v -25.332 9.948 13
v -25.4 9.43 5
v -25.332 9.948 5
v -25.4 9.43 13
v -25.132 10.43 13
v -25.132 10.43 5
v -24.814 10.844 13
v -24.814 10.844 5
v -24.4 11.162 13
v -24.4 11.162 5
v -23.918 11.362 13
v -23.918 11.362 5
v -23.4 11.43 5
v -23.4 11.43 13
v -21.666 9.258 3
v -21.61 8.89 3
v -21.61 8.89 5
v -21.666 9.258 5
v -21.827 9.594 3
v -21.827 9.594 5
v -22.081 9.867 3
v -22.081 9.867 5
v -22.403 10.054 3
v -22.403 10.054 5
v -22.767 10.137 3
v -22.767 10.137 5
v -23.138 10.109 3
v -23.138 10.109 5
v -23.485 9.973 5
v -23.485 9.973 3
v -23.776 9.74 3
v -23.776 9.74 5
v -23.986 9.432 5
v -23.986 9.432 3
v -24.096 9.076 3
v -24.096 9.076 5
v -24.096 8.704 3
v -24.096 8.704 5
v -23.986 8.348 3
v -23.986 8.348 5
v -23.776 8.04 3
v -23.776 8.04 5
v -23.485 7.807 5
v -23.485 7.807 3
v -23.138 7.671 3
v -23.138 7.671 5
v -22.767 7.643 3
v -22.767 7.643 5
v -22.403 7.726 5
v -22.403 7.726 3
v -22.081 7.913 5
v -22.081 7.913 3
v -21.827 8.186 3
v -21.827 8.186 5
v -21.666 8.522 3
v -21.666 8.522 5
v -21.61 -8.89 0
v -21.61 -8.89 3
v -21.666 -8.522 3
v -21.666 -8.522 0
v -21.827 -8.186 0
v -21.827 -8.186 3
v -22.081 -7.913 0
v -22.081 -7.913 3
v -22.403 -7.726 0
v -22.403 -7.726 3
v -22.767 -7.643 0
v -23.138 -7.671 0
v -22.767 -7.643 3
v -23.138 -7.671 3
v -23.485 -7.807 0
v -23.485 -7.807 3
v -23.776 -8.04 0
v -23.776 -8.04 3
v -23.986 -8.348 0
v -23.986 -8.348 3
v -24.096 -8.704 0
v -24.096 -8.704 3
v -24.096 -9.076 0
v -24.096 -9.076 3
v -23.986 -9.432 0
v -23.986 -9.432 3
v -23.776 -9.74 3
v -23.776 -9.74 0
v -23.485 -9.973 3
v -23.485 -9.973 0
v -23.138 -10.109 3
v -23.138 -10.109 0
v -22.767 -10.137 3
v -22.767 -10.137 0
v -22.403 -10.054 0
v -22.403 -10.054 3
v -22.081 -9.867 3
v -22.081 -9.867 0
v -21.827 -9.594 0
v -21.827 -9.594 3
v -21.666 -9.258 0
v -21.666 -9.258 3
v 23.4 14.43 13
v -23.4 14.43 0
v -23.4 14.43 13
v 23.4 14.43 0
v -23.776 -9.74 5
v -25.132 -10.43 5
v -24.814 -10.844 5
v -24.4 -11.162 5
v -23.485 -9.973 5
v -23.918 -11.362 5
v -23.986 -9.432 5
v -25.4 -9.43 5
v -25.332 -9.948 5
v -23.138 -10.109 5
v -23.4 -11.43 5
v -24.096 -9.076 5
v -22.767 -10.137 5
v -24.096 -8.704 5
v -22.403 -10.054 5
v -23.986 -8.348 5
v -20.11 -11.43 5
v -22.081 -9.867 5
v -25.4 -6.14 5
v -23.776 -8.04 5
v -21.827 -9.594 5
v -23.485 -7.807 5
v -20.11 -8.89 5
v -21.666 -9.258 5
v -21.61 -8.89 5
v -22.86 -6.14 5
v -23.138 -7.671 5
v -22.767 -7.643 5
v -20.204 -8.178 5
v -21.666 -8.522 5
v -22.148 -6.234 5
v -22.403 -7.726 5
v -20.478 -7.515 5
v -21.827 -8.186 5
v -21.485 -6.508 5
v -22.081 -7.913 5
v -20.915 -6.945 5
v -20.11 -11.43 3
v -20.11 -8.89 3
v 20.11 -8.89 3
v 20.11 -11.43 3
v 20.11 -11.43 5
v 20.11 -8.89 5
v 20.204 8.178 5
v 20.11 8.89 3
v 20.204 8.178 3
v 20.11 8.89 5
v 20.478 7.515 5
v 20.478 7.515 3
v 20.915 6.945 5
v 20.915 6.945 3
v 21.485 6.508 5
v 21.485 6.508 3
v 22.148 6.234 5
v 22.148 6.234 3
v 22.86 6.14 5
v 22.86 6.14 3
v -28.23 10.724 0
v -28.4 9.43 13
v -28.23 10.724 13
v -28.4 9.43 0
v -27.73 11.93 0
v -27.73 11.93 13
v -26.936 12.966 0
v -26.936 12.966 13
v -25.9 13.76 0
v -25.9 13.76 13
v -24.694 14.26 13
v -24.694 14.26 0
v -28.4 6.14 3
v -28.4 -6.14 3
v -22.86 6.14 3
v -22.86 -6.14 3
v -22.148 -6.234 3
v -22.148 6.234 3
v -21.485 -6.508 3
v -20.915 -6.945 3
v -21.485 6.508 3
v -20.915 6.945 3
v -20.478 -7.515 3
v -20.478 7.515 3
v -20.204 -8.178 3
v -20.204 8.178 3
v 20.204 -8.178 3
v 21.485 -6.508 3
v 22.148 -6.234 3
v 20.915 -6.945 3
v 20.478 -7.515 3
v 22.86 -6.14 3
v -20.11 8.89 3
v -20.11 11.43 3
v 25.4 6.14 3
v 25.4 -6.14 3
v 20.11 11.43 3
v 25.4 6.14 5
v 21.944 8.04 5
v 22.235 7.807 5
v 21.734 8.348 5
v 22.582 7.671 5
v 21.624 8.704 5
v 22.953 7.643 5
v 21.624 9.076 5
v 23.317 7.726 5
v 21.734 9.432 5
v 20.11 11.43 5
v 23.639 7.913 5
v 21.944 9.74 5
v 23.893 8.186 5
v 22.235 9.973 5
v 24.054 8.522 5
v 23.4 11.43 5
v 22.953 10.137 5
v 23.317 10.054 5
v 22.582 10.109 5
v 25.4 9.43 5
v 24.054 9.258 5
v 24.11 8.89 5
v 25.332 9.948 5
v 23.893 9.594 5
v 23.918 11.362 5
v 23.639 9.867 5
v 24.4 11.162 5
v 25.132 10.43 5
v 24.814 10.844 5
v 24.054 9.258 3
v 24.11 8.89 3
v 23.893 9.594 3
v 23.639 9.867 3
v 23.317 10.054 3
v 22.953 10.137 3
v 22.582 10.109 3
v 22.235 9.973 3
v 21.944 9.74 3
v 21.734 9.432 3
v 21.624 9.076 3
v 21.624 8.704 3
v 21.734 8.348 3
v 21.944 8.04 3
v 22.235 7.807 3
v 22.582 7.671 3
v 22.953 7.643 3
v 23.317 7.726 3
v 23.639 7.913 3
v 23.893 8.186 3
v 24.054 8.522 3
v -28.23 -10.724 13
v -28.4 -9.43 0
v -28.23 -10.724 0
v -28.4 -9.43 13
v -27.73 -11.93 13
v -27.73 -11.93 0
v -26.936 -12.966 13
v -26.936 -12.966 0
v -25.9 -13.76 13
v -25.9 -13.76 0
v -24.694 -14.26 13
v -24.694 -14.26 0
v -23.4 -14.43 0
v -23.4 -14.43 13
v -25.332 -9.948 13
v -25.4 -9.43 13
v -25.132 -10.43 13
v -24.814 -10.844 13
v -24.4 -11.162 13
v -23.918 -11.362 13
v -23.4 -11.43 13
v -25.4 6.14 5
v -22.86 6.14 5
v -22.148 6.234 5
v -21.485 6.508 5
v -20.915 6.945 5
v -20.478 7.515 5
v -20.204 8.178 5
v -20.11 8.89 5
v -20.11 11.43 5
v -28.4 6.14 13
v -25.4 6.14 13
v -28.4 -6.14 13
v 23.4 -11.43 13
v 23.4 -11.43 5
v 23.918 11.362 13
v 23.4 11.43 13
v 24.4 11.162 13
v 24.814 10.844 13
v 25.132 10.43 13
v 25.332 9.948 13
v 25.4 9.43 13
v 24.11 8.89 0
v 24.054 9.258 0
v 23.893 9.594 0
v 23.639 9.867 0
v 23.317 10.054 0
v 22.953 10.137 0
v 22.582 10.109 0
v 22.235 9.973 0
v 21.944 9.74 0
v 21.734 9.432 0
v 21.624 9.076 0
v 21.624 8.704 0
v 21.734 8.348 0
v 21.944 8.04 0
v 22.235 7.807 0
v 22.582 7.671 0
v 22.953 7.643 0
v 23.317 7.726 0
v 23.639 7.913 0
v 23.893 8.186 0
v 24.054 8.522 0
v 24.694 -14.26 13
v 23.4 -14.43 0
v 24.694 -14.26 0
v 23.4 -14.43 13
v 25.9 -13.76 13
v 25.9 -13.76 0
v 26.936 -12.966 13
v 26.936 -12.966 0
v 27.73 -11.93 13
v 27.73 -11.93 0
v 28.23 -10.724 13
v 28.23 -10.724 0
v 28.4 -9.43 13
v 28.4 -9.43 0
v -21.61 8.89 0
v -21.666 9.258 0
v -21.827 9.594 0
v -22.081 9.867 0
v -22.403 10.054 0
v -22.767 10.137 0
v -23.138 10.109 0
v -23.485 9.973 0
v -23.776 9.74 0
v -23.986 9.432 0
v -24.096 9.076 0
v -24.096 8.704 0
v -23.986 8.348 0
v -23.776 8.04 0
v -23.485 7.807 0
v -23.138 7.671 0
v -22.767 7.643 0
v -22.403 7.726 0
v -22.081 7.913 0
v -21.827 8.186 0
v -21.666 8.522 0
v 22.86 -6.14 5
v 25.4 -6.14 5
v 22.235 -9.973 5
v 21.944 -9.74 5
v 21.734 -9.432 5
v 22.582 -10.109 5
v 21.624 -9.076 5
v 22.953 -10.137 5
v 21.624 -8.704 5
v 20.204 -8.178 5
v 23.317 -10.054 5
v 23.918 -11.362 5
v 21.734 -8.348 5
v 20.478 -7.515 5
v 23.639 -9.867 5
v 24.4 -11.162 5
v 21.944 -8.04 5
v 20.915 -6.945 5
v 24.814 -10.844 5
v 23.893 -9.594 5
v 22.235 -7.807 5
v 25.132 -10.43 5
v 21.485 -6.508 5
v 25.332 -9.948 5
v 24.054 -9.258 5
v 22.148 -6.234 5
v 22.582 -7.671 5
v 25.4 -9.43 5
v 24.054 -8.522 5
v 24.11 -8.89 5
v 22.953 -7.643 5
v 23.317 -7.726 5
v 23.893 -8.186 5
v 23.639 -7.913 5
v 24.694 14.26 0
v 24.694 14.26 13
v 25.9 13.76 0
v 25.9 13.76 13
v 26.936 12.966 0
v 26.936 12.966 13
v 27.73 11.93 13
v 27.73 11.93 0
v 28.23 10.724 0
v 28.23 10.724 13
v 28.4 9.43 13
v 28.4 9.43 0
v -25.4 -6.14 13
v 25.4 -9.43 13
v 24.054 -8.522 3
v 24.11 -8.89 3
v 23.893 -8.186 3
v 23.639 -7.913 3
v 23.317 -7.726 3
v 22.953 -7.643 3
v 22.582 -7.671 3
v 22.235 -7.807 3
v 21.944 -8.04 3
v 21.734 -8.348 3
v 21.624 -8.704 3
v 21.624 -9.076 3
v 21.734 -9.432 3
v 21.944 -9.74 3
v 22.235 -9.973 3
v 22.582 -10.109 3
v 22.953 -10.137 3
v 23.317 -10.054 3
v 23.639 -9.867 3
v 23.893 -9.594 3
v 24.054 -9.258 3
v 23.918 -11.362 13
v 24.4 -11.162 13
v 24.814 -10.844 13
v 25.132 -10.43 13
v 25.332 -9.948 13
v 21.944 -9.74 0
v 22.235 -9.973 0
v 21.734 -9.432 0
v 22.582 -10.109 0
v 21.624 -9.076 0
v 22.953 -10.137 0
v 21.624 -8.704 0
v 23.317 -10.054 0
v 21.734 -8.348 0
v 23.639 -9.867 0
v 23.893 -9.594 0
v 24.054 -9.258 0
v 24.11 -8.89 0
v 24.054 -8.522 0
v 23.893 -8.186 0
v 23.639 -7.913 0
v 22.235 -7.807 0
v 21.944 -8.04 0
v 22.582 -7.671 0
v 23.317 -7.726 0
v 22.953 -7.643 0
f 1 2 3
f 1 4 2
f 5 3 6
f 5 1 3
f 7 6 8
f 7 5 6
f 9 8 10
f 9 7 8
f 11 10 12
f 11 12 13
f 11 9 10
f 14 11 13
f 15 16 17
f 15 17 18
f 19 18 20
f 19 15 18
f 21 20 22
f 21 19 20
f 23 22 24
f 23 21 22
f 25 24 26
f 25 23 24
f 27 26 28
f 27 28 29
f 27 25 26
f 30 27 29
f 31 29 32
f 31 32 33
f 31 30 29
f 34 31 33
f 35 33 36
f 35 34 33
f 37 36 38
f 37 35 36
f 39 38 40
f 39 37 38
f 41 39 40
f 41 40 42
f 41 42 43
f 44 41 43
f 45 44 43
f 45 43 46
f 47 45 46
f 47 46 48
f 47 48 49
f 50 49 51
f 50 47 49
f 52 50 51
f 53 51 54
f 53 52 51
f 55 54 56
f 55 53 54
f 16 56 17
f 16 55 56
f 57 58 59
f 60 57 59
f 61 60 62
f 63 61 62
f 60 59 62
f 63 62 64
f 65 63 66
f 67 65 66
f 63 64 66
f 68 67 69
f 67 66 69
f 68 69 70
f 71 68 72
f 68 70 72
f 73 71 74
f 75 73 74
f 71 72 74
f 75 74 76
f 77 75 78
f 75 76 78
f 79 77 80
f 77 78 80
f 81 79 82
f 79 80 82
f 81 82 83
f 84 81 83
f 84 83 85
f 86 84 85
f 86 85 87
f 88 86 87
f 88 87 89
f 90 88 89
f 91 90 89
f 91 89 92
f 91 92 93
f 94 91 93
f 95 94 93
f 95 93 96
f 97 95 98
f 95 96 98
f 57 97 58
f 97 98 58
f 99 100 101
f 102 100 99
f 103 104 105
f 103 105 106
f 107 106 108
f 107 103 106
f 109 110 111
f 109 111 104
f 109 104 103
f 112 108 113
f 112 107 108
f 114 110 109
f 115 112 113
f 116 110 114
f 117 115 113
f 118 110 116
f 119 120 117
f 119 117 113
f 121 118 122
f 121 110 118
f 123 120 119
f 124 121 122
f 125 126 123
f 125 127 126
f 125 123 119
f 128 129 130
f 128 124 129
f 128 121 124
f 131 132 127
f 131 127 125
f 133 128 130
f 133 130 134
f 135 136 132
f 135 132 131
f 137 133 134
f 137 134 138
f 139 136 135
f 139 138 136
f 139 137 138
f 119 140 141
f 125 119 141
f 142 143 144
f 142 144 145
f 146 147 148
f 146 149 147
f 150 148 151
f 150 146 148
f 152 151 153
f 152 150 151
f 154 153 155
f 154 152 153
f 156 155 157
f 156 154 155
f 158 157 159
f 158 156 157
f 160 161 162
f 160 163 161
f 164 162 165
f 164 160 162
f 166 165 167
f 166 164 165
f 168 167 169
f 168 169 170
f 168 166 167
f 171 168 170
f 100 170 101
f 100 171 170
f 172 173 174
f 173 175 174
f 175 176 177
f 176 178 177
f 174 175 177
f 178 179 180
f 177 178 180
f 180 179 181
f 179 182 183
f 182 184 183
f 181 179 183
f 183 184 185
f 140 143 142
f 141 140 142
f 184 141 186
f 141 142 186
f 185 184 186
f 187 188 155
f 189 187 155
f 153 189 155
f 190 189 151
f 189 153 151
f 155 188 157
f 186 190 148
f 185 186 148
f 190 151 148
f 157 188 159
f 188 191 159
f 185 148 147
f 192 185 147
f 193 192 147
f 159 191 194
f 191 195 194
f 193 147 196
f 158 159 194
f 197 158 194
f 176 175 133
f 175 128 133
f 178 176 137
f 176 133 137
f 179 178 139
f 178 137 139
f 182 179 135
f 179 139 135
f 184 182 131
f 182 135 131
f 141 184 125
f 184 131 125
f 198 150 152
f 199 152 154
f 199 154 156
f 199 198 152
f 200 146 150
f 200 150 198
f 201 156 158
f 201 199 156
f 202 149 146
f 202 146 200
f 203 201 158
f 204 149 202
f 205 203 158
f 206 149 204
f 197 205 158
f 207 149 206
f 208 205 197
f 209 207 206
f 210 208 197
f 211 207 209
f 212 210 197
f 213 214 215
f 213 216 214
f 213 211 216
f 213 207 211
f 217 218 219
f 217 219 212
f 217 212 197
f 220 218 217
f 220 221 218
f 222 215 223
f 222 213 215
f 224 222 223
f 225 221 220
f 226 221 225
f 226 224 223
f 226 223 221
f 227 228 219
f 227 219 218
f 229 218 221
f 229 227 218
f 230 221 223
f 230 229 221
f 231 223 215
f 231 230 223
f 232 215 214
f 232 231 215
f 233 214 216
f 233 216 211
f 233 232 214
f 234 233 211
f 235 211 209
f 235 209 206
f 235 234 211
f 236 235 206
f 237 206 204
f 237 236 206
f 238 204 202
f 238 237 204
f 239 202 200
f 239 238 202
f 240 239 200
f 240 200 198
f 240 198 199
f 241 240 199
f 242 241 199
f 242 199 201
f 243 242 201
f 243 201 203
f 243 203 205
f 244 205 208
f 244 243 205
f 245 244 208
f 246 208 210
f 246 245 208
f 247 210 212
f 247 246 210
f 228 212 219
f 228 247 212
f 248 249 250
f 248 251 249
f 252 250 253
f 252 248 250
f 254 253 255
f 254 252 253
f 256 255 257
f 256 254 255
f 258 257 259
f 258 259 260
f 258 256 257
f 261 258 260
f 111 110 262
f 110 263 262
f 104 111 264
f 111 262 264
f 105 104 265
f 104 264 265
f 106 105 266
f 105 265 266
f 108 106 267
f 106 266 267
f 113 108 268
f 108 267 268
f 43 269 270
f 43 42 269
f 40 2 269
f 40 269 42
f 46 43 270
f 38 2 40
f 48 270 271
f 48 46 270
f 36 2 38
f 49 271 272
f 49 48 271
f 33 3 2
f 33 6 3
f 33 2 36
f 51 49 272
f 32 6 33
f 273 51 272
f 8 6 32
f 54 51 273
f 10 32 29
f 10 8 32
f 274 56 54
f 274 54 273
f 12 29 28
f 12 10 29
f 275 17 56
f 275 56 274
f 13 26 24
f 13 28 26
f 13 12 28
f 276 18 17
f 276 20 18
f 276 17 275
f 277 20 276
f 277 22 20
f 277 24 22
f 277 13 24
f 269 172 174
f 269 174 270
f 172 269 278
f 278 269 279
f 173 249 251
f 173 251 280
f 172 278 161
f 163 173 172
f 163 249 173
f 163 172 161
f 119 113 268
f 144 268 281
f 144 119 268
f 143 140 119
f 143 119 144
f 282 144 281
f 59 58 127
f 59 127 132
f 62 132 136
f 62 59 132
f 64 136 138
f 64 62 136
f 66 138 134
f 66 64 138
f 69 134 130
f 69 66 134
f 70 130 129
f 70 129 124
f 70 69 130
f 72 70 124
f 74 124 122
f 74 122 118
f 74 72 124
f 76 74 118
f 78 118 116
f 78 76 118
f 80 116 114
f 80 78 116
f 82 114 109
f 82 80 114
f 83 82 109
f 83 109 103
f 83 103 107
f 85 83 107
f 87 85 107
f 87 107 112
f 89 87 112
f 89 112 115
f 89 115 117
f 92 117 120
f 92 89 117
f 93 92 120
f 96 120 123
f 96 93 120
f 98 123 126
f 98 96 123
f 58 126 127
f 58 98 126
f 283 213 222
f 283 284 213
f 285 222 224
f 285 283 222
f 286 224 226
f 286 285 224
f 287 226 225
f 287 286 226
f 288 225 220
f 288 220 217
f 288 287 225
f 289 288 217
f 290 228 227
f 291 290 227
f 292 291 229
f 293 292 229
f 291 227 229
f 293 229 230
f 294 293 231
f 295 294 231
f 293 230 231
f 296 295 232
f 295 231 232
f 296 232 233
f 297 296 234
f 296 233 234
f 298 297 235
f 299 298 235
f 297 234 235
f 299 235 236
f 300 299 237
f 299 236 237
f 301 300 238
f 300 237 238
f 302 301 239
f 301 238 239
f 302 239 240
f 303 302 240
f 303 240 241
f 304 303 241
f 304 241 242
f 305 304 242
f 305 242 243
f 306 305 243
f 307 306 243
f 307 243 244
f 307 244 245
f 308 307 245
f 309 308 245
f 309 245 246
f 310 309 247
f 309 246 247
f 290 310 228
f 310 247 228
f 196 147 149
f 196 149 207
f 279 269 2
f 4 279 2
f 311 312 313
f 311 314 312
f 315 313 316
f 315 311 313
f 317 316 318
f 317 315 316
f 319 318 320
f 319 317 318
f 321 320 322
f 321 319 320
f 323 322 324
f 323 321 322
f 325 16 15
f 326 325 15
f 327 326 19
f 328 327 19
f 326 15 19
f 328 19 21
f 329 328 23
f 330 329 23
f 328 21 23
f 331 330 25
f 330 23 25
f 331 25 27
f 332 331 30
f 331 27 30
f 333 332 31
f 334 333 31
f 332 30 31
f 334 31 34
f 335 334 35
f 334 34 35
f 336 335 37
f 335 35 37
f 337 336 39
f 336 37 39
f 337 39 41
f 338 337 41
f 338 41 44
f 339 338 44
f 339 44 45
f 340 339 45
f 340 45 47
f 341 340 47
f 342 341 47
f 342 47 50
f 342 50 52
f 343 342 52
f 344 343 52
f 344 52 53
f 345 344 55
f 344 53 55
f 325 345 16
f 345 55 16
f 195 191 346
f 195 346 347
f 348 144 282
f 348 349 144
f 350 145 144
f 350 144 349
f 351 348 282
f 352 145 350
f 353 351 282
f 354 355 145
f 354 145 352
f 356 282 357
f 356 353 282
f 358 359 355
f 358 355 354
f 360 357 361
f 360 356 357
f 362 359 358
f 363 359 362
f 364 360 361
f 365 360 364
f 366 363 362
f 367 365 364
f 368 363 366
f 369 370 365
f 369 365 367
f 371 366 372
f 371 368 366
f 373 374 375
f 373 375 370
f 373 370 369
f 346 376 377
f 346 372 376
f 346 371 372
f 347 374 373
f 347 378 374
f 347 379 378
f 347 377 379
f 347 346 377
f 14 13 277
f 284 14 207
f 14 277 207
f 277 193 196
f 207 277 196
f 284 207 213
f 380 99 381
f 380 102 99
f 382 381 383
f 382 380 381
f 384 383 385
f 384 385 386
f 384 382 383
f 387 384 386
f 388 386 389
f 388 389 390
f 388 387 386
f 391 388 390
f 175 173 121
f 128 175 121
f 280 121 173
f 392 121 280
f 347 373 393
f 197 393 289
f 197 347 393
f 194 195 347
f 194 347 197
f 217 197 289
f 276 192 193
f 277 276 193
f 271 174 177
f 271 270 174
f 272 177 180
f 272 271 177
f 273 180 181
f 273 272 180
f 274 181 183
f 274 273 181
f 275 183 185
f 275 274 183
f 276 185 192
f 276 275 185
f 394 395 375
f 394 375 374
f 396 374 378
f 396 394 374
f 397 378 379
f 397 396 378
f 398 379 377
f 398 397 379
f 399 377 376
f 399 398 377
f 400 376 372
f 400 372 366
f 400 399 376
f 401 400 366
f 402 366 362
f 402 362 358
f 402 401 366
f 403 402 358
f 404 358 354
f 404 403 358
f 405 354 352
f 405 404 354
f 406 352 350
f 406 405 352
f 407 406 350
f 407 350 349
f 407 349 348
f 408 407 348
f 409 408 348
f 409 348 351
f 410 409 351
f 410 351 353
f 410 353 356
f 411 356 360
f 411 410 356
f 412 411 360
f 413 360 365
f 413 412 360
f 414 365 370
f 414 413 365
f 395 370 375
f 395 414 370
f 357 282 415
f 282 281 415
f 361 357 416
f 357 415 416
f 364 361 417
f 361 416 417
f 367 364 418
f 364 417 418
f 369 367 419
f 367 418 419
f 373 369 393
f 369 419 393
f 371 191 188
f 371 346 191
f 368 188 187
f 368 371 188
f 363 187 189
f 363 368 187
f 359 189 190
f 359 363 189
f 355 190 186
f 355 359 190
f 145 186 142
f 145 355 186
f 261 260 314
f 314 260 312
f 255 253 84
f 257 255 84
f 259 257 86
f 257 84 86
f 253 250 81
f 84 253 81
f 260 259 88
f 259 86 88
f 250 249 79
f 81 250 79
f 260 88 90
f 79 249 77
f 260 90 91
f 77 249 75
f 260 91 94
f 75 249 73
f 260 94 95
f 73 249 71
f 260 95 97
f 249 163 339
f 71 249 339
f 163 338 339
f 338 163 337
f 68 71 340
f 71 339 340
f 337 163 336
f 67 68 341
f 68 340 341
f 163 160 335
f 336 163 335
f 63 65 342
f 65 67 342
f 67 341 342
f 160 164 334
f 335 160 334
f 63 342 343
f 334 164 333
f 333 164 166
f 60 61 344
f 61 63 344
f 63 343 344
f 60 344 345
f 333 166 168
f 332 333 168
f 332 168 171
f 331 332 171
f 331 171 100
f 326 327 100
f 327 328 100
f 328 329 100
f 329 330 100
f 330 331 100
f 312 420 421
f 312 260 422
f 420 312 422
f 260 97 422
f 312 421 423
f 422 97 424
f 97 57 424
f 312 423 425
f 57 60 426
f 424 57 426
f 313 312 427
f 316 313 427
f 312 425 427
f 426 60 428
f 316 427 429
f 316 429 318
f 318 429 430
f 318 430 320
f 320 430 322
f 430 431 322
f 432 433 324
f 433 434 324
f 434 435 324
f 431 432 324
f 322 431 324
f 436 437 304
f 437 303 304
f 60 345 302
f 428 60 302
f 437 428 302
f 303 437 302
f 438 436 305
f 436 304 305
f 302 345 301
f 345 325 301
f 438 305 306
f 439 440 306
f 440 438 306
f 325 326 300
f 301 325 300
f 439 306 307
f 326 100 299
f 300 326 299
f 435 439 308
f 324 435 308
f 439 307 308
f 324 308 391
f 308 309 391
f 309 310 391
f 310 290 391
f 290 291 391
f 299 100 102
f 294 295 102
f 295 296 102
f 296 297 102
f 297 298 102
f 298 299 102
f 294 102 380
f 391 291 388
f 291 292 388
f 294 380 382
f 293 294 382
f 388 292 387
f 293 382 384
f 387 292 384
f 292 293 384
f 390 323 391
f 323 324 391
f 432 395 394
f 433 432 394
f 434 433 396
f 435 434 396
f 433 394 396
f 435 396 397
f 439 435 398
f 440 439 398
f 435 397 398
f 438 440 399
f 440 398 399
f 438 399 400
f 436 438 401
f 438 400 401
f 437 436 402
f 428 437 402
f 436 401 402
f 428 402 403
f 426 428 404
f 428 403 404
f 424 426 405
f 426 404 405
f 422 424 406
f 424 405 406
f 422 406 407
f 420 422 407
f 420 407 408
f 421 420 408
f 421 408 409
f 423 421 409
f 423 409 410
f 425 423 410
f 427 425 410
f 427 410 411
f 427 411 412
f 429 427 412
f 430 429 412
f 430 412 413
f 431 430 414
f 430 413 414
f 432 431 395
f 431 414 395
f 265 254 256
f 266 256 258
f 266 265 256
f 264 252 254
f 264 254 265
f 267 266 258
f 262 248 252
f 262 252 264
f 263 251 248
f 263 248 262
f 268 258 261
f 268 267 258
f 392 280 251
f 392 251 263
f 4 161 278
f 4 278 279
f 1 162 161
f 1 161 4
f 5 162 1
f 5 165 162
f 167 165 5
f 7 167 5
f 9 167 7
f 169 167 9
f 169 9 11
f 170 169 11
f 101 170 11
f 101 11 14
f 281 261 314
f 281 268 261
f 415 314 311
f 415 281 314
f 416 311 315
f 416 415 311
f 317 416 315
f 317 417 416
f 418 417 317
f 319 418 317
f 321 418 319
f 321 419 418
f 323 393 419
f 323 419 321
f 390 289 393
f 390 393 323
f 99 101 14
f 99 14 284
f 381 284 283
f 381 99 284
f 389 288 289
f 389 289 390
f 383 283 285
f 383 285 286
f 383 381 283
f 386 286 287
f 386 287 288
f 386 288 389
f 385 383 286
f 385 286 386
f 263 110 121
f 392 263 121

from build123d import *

# Parameters (mm, degrees)
F0_W      = 56.8
F0_H      = 28.86
F1_DEPTH  = 3
F2_W      = 56.8
F2_H      = 28.86
F2_W_2    = 50.8
F2_H_2    = 22.86
F3_DEPTH  = 10
F4_W      = 5.29
F4_H      = 5.29
F4_R      = 1.25
F5_DEPTH  = 2
F6_R      = 2.75
F7_R      = 2
F8_R      = 5
F9_W      = 12.28
F9_H      = 10
F10_DEPTH = 3
F11_DEPTH = 3


with BuildPart() as f1:
    # F0 (on Top) → F1 (new body)
    with BuildSketch(Plane.XY):
        Rectangle(F0_W, F0_H)
    extrude(amount=F1_DEPTH)

    # F2 (on face) → F3 (join)
    with BuildSketch(Plane.XY.offset(3)):
        Rectangle(F2_W, F2_H)
        Rectangle(F2_W_2, F2_H_2, mode=Mode.SUBTRACT)
    extrude(amount=F3_DEPTH)

    # F4 (on face) → F5 (join)
    with BuildSketch(Plane.XY.offset(3)):
        with Locations((-22.755, 8.785)):
            Rectangle(F4_W, F4_H)
        with Locations((-22.86, 8.89)):
            Circle(F4_R, mode=Mode.SUBTRACT)
        with Locations((22.755, -8.785)):
            Rectangle(F4_W, F4_H)
        with Locations((22.86, -8.89)):
            Circle(F4_R, mode=Mode.SUBTRACT)
        with Locations((22.755, 8.785)):
            Rectangle(F4_W, F4_H)
        with Locations((22.86, 8.89)):
            Circle(F4_R, mode=Mode.SUBTRACT)
        with Locations((-22.755, -8.785)):
            Rectangle(F4_W, F4_H)
        with Locations((-22.86, -8.89)):
            Circle(F4_R, mode=Mode.SUBTRACT)
    extrude(amount=F5_DEPTH)

    # F6
    f6_edges = [f1.edges().sort_by_distance(p)[0] for p in [
        (-20.11, 6.14, 4),
        (20.11, 6.14, 4),
        (20.11, -6.14, 4),
        (-20.11, -6.14, 4),
    ]]
    fillet(f6_edges, radius=F6_R)

    # F7
    f7_edges = [f1.edges().sort_by_distance(p)[0] for p in [
        (-25.4, 11.43, 9),
        (25.4, 11.43, 9),
        (25.4, -11.43, 9),
        (-25.4, -11.43, 9),
    ]]
    fillet(f7_edges, radius=F7_R)

    # F8
    f8_edges = [f1.edges().sort_by_distance(p)[0] for p in [
        (28.4, 14.43, 6.5),
        (28.4, -14.43, 6.5),
        (-28.4, -14.43, 6.5),
        (-28.4, 14.43, 6.5),
    ]]
    fillet(f8_edges, radius=F8_R)

    # F9 (on face) → F10 (cut, through all)
    with BuildSketch(Plane.YZ.offset(-25.4)):
        with Locations((0, 8)):
            Rectangle(F9_W, F9_H)
    extrude(amount=-F10_DEPTH, mode=Mode.SUBTRACT)

    # F11 (cut, through all): faces of the model
    f11_faces = [f1.faces().sort_by_distance(p)[0] for p in [
        (22.86, 8.89, 3),
        (22.86, -8.89, 3),
        (-22.86, -8.89, 3),
        (-22.86, 8.89, 3),
    ]]
    extrude(f11_faces, amount=-F11_DEPTH, mode=Mode.SUBTRACT)


solid = f1.part
